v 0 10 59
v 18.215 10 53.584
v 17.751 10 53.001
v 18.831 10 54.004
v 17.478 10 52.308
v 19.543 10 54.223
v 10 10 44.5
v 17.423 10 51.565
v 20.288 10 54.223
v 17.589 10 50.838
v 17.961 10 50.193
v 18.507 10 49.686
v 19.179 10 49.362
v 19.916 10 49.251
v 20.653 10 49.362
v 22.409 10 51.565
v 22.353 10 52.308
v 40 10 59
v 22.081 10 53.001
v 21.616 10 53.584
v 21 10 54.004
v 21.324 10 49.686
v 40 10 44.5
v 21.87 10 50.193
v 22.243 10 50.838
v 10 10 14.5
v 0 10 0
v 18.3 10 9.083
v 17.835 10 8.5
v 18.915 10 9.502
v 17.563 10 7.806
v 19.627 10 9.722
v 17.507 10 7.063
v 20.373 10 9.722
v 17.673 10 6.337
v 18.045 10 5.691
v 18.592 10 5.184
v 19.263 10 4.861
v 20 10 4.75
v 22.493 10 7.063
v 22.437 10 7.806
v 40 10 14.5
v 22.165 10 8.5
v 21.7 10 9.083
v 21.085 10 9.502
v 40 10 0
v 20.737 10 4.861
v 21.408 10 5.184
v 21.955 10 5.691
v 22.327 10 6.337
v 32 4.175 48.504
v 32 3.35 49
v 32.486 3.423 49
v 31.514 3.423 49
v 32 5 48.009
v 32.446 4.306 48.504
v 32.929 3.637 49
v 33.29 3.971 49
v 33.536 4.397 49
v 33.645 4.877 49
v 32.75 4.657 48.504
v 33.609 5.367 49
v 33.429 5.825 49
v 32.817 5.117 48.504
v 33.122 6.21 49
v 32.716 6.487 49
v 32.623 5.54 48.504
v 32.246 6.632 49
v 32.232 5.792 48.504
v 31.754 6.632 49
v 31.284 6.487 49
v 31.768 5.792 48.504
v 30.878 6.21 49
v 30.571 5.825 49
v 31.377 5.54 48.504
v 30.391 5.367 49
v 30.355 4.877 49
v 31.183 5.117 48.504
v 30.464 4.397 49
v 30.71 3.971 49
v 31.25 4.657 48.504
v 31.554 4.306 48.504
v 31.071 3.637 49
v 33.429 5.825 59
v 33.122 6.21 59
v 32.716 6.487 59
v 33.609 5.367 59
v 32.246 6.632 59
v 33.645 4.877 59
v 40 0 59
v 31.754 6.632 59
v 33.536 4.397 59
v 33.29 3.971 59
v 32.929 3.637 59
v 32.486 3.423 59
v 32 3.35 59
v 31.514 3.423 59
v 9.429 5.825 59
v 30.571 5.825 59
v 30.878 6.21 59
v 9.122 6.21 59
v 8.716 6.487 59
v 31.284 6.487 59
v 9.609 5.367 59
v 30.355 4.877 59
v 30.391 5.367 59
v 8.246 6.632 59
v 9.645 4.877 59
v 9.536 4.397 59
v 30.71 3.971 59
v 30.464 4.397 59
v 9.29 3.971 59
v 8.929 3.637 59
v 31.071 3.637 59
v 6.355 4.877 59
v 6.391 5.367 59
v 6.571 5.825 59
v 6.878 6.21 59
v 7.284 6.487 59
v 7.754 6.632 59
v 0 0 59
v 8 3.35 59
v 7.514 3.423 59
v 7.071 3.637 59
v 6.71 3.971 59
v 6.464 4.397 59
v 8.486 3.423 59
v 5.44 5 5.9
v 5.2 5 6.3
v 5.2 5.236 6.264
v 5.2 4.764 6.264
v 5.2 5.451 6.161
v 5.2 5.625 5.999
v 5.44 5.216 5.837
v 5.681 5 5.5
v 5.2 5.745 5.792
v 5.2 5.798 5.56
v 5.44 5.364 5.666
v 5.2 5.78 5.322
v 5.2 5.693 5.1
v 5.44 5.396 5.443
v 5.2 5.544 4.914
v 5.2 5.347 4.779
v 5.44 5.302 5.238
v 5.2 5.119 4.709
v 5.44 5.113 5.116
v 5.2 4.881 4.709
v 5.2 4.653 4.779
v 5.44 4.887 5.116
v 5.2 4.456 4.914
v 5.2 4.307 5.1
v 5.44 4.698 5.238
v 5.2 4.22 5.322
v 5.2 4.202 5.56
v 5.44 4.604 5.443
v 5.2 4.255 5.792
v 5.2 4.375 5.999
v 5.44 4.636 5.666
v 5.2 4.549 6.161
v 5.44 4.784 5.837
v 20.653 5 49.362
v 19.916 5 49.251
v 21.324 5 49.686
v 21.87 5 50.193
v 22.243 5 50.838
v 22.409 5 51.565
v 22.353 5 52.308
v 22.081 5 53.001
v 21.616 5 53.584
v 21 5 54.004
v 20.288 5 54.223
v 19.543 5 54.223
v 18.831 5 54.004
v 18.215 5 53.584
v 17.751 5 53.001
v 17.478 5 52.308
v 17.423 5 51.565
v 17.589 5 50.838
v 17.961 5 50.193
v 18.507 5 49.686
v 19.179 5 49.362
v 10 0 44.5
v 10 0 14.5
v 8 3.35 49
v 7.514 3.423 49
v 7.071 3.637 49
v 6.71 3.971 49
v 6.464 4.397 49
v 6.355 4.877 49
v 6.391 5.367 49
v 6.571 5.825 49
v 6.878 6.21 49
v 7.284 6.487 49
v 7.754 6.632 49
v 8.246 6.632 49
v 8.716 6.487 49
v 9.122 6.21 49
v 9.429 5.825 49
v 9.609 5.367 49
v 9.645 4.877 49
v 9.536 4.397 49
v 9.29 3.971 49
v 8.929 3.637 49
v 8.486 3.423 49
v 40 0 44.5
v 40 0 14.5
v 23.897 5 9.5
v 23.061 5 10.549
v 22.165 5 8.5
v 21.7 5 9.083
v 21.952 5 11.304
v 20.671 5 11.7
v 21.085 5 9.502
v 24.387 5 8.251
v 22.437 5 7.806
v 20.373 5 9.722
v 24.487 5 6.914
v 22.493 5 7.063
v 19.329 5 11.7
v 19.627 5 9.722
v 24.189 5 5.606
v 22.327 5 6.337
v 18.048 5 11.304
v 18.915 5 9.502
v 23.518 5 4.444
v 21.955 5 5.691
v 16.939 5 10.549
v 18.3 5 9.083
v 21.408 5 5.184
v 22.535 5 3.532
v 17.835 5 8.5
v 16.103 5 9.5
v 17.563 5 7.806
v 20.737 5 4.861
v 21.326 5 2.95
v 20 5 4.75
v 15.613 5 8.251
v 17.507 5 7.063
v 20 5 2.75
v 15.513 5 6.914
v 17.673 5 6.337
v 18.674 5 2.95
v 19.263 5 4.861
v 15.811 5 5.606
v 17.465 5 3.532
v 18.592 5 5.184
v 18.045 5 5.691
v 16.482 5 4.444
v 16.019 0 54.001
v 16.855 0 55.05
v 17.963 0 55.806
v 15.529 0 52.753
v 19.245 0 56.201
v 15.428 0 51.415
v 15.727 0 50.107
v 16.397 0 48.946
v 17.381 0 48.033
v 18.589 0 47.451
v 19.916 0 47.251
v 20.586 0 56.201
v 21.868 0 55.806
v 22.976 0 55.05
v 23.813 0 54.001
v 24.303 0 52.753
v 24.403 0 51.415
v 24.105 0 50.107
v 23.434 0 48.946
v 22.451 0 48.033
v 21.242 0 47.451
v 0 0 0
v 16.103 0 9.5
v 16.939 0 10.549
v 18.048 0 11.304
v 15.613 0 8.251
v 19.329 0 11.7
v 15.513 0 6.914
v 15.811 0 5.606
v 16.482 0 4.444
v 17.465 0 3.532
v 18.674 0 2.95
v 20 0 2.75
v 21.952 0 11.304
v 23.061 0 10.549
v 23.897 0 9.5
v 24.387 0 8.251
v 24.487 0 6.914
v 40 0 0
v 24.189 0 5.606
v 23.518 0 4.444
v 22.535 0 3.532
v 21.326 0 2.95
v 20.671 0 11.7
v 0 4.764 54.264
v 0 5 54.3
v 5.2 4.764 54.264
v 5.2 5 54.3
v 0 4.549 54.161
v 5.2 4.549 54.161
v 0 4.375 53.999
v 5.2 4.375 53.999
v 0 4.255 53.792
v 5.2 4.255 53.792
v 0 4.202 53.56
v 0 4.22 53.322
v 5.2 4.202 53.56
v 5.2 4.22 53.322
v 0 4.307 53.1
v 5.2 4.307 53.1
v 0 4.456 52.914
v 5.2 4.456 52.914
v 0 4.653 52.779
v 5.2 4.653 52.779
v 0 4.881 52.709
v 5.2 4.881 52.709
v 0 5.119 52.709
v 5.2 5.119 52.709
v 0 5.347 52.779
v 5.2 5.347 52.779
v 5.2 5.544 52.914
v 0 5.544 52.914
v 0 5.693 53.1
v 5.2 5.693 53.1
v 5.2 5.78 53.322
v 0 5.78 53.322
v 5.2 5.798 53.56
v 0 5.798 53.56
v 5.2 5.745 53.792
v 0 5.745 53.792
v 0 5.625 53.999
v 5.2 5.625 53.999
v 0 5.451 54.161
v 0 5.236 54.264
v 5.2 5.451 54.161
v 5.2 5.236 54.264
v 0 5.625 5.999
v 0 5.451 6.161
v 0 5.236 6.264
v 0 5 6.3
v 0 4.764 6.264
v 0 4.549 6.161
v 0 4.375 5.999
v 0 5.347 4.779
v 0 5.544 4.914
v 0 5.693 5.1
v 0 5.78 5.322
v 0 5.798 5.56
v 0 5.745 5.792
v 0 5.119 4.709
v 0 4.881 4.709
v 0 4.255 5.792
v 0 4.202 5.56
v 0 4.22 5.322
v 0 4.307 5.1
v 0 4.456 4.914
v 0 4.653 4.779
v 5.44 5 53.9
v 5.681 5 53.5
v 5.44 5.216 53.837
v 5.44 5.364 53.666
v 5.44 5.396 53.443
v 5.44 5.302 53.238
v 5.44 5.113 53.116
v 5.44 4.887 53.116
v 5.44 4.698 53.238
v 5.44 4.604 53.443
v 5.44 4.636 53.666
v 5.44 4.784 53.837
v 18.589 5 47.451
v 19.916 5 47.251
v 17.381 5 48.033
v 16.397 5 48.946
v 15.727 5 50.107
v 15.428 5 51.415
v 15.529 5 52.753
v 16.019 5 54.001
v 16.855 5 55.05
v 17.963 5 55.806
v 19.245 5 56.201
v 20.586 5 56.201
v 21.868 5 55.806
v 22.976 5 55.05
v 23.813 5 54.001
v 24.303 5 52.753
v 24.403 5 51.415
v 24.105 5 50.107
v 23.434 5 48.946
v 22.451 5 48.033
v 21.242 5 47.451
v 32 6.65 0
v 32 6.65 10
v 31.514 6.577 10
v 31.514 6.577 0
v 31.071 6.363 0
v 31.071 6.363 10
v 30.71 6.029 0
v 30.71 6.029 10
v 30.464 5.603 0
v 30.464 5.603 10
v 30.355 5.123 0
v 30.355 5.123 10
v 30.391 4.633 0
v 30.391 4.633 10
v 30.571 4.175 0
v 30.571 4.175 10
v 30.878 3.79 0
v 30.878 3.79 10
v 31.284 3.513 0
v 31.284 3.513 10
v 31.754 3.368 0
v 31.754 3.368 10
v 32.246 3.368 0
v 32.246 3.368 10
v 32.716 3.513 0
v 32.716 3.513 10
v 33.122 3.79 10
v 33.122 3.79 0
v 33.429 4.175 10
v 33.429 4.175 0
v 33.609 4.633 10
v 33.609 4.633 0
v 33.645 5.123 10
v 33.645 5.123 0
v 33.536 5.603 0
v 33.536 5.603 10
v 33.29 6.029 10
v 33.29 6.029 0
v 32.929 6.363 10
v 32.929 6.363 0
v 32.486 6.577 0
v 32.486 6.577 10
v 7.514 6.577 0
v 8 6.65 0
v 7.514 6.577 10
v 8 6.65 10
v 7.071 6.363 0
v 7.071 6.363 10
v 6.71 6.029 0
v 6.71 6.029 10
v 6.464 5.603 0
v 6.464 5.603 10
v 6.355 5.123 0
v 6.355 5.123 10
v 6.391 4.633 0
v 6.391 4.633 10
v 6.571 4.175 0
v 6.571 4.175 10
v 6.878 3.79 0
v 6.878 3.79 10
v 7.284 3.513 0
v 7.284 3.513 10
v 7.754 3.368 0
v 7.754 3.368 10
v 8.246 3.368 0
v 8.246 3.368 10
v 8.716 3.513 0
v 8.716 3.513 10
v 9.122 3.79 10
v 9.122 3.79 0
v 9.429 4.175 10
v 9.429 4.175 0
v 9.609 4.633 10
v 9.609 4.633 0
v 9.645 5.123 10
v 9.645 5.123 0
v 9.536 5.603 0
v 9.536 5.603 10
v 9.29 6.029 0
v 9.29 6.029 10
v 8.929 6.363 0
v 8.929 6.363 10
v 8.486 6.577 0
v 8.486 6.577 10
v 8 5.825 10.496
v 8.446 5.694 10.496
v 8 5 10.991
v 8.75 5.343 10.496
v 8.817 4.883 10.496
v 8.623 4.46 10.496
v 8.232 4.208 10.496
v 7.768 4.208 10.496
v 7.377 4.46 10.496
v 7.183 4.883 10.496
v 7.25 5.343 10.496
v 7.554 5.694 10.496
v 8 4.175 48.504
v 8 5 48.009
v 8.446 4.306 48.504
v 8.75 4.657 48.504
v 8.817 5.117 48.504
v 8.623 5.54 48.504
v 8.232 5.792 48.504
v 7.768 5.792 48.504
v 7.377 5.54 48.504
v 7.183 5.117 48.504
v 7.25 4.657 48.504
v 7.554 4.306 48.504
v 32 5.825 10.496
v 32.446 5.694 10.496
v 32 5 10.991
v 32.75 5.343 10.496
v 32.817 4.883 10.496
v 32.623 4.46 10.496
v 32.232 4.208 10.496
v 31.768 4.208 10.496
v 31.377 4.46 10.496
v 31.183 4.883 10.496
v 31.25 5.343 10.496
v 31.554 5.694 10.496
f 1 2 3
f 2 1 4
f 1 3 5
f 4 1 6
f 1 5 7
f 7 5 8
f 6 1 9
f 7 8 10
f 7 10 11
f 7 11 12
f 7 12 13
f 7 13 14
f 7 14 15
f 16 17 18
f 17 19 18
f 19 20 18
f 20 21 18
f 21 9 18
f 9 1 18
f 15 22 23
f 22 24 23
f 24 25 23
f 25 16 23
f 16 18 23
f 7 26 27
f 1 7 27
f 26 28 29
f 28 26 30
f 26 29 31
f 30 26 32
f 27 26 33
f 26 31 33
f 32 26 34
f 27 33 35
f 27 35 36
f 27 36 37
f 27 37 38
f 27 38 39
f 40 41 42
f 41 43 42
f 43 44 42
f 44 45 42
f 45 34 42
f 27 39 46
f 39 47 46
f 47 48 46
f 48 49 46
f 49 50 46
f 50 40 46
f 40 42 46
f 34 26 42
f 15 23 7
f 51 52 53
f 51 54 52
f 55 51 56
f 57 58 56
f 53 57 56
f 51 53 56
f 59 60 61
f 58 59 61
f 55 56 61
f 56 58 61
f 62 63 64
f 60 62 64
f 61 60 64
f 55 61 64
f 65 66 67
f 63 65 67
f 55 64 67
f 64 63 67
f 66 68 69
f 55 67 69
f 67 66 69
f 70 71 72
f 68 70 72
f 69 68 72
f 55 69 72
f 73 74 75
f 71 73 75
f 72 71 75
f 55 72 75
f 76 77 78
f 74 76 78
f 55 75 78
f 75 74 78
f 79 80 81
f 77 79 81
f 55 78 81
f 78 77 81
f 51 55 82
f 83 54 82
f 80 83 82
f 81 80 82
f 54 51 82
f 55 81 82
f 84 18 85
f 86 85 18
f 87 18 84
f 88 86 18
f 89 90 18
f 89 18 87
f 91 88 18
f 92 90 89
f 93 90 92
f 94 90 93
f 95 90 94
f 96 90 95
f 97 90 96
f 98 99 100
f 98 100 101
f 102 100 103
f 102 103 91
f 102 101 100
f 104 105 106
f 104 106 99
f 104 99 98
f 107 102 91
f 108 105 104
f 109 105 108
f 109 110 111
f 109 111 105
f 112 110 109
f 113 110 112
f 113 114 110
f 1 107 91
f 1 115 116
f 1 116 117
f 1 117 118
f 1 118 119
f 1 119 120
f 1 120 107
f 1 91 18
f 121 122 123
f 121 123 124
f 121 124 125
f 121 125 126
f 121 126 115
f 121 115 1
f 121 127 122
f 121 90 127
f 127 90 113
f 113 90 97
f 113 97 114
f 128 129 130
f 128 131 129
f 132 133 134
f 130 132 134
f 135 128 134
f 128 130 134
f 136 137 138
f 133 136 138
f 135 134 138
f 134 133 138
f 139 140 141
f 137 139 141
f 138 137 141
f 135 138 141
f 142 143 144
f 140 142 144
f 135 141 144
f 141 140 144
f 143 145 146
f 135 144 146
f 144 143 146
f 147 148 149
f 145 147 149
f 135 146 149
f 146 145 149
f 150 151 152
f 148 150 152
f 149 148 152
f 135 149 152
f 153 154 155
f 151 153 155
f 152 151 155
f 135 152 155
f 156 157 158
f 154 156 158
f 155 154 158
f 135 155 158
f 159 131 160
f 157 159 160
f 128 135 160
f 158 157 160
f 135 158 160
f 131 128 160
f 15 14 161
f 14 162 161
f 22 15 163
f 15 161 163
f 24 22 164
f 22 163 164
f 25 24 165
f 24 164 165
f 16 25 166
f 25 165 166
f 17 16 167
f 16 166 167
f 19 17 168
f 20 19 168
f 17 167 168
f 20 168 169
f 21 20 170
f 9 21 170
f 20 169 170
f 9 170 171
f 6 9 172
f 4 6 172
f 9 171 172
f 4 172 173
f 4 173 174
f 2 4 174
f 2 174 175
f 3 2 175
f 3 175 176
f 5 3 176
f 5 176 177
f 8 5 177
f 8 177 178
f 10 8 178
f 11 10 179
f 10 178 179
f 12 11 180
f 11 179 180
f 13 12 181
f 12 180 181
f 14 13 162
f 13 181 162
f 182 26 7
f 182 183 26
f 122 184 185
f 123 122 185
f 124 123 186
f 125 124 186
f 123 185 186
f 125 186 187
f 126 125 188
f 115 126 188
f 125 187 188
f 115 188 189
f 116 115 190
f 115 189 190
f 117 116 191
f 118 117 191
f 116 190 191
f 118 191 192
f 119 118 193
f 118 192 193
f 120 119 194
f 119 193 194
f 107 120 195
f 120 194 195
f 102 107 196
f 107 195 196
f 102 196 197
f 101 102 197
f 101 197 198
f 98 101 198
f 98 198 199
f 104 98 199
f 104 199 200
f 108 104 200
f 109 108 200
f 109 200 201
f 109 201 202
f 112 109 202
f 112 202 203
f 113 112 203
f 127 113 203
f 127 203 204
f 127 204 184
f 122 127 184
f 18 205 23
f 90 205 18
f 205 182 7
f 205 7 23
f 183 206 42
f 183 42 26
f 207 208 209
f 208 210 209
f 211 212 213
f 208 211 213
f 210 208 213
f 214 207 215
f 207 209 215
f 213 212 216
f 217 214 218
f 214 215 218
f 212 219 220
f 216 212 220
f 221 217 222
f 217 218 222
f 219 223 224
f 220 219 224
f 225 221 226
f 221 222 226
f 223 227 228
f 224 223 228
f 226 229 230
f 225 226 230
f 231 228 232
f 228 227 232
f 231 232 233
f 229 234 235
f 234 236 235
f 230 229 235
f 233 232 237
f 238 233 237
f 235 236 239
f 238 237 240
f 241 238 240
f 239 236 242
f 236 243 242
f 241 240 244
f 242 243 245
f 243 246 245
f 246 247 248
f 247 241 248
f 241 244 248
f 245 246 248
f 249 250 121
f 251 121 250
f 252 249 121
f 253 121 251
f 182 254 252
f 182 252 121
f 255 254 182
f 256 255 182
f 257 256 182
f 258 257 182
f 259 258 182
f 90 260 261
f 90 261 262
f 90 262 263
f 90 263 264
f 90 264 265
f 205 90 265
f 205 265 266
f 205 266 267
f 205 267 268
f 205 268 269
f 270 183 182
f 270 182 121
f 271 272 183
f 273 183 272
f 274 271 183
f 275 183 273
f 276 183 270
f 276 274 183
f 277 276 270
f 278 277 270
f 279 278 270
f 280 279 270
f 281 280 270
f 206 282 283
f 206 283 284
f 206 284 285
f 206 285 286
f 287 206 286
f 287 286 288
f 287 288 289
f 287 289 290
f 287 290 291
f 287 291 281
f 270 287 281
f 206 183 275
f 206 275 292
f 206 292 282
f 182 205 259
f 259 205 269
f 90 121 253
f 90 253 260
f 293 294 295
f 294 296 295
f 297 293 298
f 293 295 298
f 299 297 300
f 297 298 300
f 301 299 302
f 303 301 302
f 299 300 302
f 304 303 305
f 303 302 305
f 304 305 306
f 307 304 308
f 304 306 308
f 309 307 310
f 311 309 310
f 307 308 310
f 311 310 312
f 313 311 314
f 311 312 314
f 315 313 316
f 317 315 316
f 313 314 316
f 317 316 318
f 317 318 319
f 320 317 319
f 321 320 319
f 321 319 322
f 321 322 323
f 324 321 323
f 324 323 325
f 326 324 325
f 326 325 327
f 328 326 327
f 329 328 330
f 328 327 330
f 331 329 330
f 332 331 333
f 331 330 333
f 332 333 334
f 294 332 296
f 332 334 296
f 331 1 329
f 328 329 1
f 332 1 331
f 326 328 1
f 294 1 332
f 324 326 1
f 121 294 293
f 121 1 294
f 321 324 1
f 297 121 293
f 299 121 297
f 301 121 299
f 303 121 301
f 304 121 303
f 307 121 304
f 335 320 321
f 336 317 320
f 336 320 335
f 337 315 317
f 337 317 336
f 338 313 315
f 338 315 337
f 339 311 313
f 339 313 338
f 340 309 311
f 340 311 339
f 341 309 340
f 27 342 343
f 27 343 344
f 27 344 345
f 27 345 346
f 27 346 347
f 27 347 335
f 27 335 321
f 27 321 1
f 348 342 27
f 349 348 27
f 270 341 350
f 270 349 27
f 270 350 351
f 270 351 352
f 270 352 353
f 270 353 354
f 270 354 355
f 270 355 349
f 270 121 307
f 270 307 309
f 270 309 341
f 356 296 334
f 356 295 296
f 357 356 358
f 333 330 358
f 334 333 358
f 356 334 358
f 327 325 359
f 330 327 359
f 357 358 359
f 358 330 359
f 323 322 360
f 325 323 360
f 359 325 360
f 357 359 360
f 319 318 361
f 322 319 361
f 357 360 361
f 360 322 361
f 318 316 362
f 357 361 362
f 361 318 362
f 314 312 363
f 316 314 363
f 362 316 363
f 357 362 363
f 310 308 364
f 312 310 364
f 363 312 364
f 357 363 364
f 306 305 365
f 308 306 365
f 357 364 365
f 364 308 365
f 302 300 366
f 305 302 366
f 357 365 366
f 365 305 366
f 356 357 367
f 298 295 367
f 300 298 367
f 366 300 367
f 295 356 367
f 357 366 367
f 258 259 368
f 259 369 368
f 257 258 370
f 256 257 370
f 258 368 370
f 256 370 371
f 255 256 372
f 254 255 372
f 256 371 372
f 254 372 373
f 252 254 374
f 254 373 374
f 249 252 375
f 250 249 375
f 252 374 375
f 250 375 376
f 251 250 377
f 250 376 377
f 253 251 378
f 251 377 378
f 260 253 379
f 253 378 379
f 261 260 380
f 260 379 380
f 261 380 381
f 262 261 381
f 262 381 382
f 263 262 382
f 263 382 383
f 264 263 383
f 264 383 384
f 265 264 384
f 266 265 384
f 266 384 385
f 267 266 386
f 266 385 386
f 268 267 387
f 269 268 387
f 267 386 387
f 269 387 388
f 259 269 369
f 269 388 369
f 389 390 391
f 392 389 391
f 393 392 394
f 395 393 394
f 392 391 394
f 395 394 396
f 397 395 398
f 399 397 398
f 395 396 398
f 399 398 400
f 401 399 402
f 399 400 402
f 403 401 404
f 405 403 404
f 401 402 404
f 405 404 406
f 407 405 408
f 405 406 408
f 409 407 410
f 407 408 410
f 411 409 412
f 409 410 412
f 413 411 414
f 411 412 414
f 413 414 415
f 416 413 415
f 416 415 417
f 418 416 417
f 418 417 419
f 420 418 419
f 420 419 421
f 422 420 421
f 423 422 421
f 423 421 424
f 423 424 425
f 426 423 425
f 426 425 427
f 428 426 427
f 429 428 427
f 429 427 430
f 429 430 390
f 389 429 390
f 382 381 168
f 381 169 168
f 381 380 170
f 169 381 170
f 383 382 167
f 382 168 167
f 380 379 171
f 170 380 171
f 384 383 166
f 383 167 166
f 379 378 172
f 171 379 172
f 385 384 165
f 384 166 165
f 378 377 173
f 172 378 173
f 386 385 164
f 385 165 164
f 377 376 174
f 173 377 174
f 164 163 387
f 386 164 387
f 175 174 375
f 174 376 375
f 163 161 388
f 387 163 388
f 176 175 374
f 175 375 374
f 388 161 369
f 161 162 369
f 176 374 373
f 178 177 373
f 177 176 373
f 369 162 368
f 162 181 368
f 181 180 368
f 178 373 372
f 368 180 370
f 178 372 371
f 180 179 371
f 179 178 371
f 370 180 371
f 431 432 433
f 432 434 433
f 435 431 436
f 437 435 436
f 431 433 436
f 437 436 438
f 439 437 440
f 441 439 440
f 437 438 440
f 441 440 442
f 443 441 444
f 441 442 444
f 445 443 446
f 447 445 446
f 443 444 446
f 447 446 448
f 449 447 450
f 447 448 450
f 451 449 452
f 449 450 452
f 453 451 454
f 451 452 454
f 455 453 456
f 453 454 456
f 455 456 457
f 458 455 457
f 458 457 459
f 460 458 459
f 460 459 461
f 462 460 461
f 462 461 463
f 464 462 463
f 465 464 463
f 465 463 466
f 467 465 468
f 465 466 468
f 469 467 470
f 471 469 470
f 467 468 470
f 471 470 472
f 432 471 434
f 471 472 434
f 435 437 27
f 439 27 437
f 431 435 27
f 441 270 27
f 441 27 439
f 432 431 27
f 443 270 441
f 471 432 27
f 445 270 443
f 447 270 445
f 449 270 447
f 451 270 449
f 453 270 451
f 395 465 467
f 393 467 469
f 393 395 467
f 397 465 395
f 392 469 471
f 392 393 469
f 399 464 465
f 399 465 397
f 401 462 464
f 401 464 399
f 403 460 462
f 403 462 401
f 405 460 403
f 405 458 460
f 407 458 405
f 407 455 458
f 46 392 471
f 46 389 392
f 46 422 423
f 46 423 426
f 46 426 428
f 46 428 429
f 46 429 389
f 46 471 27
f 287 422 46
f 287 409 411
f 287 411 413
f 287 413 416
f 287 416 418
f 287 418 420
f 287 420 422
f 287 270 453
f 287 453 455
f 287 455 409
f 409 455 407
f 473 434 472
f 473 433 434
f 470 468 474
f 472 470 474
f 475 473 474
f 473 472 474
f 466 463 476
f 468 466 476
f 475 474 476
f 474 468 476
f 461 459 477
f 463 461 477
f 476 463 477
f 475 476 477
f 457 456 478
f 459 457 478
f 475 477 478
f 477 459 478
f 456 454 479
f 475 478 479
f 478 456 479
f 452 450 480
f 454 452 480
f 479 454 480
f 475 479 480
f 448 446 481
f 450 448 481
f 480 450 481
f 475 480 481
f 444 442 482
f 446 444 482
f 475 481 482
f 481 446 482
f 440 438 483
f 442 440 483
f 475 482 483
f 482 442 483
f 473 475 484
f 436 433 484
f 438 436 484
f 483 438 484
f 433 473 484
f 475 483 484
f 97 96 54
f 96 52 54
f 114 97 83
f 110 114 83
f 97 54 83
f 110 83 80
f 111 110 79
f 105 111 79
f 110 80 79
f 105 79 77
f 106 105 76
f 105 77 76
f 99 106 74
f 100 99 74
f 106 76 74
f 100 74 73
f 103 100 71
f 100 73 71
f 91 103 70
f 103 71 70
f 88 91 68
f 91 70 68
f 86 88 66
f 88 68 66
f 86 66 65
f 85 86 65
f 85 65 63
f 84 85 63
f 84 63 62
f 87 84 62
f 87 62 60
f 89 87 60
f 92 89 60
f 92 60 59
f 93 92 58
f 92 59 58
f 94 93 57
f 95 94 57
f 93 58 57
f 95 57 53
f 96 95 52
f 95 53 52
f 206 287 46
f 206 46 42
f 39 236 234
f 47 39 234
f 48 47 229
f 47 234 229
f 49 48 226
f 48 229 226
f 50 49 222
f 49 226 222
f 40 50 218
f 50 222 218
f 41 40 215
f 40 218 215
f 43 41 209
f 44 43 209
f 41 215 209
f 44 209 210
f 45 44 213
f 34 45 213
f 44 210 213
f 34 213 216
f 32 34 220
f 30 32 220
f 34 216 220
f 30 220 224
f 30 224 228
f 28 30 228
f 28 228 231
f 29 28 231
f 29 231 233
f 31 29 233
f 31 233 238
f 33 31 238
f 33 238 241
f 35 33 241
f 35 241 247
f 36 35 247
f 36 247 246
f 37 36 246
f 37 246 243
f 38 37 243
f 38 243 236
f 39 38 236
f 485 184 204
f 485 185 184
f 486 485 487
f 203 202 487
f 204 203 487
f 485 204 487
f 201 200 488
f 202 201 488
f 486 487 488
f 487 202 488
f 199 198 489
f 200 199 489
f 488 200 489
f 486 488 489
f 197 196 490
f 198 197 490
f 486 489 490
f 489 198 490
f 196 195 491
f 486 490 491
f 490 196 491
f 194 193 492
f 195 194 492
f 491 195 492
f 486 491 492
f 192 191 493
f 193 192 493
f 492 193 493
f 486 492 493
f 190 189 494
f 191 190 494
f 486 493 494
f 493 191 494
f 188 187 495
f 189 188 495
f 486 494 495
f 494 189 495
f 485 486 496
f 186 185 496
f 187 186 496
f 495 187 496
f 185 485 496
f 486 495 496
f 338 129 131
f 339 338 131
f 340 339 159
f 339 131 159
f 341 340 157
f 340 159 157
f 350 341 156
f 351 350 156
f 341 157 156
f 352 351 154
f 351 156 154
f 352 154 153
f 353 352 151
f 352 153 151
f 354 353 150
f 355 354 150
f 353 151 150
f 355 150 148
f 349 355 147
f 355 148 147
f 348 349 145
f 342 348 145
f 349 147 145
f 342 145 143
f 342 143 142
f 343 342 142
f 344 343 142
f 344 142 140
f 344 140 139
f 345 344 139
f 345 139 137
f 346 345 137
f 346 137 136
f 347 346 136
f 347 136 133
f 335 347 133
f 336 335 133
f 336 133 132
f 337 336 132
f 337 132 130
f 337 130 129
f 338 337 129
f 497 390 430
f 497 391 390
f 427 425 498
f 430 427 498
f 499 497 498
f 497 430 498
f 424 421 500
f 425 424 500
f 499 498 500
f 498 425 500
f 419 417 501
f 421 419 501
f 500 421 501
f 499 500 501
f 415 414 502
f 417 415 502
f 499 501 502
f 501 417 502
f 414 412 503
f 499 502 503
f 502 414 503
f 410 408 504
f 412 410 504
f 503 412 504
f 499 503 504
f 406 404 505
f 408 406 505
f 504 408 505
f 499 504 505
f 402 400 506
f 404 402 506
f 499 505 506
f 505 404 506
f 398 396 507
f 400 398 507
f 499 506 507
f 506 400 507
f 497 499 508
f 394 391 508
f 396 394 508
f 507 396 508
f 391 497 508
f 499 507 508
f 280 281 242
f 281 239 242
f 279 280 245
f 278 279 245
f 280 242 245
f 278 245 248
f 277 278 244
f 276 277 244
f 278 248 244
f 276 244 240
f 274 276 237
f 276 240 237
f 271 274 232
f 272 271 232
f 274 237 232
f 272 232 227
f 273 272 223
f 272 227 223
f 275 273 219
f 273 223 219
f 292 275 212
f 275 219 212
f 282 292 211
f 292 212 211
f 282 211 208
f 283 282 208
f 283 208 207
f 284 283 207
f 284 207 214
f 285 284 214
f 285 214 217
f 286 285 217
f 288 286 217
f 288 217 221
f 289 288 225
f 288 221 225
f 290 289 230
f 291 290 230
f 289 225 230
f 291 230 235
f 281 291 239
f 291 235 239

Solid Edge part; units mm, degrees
sketch "Sketch1" plane through (0, 0, 0) normal (0, -1, 0) x (1, 0, 0)
  line L0 (40, 59) -> (0, 59)
  line L1 (0, 59) -> (0, 0)
  line L2 (0, 0) -> (40, 0)
  line L3 (40, 0) -> (40, 14.5)
  line L4 (40, 14.5) -> (10, 14.5)
  line L5 (10, 14.5) -> (10, 44.5)
  line L6 (10, 44.5) -> (40, 44.5)
  line L7 (40, 44.5) -> (40, 59)
extrude "Protrusion1" add sketch "Sketch1" against normal blind 10
hole "Furo_1" at (19.9157, 0, 51.7514) direction (0, 1, 0) diameter 5 end up to next counterbore diameter 9 counterbore depth 5
hole "Hole1" at (20, 0, 7.25) direction (0, 1, 0) diameter 5 end up to next counterbore diameter 9 counterbore depth 5
hole "Furo_3" at (8, 5, 0) direction (0, 0, 1) diameter 3.3 depth 10 tip angle 118
hole "Furo_4" at (32, 5, 0) direction (0, 0, 1) diameter 3.3 depth 10 tip angle 118
hole "Furo_5" at (32, 5, 59) direction (0, 0, -1) diameter 3.3 depth 10 tip angle 118
hole "Hole2" at (8, 5, 59) direction (0, 0, -1) diameter 3.3 depth 10 tip angle 118
hole "Furo_7" at (0, 5, 53.5) direction (1, 0, 0) diameter 1.6 depth 5.2 tip angle 118
hole "Hole3" at (0, 5, 5.5) direction (1, 0, 0) diameter 1.6 depth 5.2 tip angle 118
